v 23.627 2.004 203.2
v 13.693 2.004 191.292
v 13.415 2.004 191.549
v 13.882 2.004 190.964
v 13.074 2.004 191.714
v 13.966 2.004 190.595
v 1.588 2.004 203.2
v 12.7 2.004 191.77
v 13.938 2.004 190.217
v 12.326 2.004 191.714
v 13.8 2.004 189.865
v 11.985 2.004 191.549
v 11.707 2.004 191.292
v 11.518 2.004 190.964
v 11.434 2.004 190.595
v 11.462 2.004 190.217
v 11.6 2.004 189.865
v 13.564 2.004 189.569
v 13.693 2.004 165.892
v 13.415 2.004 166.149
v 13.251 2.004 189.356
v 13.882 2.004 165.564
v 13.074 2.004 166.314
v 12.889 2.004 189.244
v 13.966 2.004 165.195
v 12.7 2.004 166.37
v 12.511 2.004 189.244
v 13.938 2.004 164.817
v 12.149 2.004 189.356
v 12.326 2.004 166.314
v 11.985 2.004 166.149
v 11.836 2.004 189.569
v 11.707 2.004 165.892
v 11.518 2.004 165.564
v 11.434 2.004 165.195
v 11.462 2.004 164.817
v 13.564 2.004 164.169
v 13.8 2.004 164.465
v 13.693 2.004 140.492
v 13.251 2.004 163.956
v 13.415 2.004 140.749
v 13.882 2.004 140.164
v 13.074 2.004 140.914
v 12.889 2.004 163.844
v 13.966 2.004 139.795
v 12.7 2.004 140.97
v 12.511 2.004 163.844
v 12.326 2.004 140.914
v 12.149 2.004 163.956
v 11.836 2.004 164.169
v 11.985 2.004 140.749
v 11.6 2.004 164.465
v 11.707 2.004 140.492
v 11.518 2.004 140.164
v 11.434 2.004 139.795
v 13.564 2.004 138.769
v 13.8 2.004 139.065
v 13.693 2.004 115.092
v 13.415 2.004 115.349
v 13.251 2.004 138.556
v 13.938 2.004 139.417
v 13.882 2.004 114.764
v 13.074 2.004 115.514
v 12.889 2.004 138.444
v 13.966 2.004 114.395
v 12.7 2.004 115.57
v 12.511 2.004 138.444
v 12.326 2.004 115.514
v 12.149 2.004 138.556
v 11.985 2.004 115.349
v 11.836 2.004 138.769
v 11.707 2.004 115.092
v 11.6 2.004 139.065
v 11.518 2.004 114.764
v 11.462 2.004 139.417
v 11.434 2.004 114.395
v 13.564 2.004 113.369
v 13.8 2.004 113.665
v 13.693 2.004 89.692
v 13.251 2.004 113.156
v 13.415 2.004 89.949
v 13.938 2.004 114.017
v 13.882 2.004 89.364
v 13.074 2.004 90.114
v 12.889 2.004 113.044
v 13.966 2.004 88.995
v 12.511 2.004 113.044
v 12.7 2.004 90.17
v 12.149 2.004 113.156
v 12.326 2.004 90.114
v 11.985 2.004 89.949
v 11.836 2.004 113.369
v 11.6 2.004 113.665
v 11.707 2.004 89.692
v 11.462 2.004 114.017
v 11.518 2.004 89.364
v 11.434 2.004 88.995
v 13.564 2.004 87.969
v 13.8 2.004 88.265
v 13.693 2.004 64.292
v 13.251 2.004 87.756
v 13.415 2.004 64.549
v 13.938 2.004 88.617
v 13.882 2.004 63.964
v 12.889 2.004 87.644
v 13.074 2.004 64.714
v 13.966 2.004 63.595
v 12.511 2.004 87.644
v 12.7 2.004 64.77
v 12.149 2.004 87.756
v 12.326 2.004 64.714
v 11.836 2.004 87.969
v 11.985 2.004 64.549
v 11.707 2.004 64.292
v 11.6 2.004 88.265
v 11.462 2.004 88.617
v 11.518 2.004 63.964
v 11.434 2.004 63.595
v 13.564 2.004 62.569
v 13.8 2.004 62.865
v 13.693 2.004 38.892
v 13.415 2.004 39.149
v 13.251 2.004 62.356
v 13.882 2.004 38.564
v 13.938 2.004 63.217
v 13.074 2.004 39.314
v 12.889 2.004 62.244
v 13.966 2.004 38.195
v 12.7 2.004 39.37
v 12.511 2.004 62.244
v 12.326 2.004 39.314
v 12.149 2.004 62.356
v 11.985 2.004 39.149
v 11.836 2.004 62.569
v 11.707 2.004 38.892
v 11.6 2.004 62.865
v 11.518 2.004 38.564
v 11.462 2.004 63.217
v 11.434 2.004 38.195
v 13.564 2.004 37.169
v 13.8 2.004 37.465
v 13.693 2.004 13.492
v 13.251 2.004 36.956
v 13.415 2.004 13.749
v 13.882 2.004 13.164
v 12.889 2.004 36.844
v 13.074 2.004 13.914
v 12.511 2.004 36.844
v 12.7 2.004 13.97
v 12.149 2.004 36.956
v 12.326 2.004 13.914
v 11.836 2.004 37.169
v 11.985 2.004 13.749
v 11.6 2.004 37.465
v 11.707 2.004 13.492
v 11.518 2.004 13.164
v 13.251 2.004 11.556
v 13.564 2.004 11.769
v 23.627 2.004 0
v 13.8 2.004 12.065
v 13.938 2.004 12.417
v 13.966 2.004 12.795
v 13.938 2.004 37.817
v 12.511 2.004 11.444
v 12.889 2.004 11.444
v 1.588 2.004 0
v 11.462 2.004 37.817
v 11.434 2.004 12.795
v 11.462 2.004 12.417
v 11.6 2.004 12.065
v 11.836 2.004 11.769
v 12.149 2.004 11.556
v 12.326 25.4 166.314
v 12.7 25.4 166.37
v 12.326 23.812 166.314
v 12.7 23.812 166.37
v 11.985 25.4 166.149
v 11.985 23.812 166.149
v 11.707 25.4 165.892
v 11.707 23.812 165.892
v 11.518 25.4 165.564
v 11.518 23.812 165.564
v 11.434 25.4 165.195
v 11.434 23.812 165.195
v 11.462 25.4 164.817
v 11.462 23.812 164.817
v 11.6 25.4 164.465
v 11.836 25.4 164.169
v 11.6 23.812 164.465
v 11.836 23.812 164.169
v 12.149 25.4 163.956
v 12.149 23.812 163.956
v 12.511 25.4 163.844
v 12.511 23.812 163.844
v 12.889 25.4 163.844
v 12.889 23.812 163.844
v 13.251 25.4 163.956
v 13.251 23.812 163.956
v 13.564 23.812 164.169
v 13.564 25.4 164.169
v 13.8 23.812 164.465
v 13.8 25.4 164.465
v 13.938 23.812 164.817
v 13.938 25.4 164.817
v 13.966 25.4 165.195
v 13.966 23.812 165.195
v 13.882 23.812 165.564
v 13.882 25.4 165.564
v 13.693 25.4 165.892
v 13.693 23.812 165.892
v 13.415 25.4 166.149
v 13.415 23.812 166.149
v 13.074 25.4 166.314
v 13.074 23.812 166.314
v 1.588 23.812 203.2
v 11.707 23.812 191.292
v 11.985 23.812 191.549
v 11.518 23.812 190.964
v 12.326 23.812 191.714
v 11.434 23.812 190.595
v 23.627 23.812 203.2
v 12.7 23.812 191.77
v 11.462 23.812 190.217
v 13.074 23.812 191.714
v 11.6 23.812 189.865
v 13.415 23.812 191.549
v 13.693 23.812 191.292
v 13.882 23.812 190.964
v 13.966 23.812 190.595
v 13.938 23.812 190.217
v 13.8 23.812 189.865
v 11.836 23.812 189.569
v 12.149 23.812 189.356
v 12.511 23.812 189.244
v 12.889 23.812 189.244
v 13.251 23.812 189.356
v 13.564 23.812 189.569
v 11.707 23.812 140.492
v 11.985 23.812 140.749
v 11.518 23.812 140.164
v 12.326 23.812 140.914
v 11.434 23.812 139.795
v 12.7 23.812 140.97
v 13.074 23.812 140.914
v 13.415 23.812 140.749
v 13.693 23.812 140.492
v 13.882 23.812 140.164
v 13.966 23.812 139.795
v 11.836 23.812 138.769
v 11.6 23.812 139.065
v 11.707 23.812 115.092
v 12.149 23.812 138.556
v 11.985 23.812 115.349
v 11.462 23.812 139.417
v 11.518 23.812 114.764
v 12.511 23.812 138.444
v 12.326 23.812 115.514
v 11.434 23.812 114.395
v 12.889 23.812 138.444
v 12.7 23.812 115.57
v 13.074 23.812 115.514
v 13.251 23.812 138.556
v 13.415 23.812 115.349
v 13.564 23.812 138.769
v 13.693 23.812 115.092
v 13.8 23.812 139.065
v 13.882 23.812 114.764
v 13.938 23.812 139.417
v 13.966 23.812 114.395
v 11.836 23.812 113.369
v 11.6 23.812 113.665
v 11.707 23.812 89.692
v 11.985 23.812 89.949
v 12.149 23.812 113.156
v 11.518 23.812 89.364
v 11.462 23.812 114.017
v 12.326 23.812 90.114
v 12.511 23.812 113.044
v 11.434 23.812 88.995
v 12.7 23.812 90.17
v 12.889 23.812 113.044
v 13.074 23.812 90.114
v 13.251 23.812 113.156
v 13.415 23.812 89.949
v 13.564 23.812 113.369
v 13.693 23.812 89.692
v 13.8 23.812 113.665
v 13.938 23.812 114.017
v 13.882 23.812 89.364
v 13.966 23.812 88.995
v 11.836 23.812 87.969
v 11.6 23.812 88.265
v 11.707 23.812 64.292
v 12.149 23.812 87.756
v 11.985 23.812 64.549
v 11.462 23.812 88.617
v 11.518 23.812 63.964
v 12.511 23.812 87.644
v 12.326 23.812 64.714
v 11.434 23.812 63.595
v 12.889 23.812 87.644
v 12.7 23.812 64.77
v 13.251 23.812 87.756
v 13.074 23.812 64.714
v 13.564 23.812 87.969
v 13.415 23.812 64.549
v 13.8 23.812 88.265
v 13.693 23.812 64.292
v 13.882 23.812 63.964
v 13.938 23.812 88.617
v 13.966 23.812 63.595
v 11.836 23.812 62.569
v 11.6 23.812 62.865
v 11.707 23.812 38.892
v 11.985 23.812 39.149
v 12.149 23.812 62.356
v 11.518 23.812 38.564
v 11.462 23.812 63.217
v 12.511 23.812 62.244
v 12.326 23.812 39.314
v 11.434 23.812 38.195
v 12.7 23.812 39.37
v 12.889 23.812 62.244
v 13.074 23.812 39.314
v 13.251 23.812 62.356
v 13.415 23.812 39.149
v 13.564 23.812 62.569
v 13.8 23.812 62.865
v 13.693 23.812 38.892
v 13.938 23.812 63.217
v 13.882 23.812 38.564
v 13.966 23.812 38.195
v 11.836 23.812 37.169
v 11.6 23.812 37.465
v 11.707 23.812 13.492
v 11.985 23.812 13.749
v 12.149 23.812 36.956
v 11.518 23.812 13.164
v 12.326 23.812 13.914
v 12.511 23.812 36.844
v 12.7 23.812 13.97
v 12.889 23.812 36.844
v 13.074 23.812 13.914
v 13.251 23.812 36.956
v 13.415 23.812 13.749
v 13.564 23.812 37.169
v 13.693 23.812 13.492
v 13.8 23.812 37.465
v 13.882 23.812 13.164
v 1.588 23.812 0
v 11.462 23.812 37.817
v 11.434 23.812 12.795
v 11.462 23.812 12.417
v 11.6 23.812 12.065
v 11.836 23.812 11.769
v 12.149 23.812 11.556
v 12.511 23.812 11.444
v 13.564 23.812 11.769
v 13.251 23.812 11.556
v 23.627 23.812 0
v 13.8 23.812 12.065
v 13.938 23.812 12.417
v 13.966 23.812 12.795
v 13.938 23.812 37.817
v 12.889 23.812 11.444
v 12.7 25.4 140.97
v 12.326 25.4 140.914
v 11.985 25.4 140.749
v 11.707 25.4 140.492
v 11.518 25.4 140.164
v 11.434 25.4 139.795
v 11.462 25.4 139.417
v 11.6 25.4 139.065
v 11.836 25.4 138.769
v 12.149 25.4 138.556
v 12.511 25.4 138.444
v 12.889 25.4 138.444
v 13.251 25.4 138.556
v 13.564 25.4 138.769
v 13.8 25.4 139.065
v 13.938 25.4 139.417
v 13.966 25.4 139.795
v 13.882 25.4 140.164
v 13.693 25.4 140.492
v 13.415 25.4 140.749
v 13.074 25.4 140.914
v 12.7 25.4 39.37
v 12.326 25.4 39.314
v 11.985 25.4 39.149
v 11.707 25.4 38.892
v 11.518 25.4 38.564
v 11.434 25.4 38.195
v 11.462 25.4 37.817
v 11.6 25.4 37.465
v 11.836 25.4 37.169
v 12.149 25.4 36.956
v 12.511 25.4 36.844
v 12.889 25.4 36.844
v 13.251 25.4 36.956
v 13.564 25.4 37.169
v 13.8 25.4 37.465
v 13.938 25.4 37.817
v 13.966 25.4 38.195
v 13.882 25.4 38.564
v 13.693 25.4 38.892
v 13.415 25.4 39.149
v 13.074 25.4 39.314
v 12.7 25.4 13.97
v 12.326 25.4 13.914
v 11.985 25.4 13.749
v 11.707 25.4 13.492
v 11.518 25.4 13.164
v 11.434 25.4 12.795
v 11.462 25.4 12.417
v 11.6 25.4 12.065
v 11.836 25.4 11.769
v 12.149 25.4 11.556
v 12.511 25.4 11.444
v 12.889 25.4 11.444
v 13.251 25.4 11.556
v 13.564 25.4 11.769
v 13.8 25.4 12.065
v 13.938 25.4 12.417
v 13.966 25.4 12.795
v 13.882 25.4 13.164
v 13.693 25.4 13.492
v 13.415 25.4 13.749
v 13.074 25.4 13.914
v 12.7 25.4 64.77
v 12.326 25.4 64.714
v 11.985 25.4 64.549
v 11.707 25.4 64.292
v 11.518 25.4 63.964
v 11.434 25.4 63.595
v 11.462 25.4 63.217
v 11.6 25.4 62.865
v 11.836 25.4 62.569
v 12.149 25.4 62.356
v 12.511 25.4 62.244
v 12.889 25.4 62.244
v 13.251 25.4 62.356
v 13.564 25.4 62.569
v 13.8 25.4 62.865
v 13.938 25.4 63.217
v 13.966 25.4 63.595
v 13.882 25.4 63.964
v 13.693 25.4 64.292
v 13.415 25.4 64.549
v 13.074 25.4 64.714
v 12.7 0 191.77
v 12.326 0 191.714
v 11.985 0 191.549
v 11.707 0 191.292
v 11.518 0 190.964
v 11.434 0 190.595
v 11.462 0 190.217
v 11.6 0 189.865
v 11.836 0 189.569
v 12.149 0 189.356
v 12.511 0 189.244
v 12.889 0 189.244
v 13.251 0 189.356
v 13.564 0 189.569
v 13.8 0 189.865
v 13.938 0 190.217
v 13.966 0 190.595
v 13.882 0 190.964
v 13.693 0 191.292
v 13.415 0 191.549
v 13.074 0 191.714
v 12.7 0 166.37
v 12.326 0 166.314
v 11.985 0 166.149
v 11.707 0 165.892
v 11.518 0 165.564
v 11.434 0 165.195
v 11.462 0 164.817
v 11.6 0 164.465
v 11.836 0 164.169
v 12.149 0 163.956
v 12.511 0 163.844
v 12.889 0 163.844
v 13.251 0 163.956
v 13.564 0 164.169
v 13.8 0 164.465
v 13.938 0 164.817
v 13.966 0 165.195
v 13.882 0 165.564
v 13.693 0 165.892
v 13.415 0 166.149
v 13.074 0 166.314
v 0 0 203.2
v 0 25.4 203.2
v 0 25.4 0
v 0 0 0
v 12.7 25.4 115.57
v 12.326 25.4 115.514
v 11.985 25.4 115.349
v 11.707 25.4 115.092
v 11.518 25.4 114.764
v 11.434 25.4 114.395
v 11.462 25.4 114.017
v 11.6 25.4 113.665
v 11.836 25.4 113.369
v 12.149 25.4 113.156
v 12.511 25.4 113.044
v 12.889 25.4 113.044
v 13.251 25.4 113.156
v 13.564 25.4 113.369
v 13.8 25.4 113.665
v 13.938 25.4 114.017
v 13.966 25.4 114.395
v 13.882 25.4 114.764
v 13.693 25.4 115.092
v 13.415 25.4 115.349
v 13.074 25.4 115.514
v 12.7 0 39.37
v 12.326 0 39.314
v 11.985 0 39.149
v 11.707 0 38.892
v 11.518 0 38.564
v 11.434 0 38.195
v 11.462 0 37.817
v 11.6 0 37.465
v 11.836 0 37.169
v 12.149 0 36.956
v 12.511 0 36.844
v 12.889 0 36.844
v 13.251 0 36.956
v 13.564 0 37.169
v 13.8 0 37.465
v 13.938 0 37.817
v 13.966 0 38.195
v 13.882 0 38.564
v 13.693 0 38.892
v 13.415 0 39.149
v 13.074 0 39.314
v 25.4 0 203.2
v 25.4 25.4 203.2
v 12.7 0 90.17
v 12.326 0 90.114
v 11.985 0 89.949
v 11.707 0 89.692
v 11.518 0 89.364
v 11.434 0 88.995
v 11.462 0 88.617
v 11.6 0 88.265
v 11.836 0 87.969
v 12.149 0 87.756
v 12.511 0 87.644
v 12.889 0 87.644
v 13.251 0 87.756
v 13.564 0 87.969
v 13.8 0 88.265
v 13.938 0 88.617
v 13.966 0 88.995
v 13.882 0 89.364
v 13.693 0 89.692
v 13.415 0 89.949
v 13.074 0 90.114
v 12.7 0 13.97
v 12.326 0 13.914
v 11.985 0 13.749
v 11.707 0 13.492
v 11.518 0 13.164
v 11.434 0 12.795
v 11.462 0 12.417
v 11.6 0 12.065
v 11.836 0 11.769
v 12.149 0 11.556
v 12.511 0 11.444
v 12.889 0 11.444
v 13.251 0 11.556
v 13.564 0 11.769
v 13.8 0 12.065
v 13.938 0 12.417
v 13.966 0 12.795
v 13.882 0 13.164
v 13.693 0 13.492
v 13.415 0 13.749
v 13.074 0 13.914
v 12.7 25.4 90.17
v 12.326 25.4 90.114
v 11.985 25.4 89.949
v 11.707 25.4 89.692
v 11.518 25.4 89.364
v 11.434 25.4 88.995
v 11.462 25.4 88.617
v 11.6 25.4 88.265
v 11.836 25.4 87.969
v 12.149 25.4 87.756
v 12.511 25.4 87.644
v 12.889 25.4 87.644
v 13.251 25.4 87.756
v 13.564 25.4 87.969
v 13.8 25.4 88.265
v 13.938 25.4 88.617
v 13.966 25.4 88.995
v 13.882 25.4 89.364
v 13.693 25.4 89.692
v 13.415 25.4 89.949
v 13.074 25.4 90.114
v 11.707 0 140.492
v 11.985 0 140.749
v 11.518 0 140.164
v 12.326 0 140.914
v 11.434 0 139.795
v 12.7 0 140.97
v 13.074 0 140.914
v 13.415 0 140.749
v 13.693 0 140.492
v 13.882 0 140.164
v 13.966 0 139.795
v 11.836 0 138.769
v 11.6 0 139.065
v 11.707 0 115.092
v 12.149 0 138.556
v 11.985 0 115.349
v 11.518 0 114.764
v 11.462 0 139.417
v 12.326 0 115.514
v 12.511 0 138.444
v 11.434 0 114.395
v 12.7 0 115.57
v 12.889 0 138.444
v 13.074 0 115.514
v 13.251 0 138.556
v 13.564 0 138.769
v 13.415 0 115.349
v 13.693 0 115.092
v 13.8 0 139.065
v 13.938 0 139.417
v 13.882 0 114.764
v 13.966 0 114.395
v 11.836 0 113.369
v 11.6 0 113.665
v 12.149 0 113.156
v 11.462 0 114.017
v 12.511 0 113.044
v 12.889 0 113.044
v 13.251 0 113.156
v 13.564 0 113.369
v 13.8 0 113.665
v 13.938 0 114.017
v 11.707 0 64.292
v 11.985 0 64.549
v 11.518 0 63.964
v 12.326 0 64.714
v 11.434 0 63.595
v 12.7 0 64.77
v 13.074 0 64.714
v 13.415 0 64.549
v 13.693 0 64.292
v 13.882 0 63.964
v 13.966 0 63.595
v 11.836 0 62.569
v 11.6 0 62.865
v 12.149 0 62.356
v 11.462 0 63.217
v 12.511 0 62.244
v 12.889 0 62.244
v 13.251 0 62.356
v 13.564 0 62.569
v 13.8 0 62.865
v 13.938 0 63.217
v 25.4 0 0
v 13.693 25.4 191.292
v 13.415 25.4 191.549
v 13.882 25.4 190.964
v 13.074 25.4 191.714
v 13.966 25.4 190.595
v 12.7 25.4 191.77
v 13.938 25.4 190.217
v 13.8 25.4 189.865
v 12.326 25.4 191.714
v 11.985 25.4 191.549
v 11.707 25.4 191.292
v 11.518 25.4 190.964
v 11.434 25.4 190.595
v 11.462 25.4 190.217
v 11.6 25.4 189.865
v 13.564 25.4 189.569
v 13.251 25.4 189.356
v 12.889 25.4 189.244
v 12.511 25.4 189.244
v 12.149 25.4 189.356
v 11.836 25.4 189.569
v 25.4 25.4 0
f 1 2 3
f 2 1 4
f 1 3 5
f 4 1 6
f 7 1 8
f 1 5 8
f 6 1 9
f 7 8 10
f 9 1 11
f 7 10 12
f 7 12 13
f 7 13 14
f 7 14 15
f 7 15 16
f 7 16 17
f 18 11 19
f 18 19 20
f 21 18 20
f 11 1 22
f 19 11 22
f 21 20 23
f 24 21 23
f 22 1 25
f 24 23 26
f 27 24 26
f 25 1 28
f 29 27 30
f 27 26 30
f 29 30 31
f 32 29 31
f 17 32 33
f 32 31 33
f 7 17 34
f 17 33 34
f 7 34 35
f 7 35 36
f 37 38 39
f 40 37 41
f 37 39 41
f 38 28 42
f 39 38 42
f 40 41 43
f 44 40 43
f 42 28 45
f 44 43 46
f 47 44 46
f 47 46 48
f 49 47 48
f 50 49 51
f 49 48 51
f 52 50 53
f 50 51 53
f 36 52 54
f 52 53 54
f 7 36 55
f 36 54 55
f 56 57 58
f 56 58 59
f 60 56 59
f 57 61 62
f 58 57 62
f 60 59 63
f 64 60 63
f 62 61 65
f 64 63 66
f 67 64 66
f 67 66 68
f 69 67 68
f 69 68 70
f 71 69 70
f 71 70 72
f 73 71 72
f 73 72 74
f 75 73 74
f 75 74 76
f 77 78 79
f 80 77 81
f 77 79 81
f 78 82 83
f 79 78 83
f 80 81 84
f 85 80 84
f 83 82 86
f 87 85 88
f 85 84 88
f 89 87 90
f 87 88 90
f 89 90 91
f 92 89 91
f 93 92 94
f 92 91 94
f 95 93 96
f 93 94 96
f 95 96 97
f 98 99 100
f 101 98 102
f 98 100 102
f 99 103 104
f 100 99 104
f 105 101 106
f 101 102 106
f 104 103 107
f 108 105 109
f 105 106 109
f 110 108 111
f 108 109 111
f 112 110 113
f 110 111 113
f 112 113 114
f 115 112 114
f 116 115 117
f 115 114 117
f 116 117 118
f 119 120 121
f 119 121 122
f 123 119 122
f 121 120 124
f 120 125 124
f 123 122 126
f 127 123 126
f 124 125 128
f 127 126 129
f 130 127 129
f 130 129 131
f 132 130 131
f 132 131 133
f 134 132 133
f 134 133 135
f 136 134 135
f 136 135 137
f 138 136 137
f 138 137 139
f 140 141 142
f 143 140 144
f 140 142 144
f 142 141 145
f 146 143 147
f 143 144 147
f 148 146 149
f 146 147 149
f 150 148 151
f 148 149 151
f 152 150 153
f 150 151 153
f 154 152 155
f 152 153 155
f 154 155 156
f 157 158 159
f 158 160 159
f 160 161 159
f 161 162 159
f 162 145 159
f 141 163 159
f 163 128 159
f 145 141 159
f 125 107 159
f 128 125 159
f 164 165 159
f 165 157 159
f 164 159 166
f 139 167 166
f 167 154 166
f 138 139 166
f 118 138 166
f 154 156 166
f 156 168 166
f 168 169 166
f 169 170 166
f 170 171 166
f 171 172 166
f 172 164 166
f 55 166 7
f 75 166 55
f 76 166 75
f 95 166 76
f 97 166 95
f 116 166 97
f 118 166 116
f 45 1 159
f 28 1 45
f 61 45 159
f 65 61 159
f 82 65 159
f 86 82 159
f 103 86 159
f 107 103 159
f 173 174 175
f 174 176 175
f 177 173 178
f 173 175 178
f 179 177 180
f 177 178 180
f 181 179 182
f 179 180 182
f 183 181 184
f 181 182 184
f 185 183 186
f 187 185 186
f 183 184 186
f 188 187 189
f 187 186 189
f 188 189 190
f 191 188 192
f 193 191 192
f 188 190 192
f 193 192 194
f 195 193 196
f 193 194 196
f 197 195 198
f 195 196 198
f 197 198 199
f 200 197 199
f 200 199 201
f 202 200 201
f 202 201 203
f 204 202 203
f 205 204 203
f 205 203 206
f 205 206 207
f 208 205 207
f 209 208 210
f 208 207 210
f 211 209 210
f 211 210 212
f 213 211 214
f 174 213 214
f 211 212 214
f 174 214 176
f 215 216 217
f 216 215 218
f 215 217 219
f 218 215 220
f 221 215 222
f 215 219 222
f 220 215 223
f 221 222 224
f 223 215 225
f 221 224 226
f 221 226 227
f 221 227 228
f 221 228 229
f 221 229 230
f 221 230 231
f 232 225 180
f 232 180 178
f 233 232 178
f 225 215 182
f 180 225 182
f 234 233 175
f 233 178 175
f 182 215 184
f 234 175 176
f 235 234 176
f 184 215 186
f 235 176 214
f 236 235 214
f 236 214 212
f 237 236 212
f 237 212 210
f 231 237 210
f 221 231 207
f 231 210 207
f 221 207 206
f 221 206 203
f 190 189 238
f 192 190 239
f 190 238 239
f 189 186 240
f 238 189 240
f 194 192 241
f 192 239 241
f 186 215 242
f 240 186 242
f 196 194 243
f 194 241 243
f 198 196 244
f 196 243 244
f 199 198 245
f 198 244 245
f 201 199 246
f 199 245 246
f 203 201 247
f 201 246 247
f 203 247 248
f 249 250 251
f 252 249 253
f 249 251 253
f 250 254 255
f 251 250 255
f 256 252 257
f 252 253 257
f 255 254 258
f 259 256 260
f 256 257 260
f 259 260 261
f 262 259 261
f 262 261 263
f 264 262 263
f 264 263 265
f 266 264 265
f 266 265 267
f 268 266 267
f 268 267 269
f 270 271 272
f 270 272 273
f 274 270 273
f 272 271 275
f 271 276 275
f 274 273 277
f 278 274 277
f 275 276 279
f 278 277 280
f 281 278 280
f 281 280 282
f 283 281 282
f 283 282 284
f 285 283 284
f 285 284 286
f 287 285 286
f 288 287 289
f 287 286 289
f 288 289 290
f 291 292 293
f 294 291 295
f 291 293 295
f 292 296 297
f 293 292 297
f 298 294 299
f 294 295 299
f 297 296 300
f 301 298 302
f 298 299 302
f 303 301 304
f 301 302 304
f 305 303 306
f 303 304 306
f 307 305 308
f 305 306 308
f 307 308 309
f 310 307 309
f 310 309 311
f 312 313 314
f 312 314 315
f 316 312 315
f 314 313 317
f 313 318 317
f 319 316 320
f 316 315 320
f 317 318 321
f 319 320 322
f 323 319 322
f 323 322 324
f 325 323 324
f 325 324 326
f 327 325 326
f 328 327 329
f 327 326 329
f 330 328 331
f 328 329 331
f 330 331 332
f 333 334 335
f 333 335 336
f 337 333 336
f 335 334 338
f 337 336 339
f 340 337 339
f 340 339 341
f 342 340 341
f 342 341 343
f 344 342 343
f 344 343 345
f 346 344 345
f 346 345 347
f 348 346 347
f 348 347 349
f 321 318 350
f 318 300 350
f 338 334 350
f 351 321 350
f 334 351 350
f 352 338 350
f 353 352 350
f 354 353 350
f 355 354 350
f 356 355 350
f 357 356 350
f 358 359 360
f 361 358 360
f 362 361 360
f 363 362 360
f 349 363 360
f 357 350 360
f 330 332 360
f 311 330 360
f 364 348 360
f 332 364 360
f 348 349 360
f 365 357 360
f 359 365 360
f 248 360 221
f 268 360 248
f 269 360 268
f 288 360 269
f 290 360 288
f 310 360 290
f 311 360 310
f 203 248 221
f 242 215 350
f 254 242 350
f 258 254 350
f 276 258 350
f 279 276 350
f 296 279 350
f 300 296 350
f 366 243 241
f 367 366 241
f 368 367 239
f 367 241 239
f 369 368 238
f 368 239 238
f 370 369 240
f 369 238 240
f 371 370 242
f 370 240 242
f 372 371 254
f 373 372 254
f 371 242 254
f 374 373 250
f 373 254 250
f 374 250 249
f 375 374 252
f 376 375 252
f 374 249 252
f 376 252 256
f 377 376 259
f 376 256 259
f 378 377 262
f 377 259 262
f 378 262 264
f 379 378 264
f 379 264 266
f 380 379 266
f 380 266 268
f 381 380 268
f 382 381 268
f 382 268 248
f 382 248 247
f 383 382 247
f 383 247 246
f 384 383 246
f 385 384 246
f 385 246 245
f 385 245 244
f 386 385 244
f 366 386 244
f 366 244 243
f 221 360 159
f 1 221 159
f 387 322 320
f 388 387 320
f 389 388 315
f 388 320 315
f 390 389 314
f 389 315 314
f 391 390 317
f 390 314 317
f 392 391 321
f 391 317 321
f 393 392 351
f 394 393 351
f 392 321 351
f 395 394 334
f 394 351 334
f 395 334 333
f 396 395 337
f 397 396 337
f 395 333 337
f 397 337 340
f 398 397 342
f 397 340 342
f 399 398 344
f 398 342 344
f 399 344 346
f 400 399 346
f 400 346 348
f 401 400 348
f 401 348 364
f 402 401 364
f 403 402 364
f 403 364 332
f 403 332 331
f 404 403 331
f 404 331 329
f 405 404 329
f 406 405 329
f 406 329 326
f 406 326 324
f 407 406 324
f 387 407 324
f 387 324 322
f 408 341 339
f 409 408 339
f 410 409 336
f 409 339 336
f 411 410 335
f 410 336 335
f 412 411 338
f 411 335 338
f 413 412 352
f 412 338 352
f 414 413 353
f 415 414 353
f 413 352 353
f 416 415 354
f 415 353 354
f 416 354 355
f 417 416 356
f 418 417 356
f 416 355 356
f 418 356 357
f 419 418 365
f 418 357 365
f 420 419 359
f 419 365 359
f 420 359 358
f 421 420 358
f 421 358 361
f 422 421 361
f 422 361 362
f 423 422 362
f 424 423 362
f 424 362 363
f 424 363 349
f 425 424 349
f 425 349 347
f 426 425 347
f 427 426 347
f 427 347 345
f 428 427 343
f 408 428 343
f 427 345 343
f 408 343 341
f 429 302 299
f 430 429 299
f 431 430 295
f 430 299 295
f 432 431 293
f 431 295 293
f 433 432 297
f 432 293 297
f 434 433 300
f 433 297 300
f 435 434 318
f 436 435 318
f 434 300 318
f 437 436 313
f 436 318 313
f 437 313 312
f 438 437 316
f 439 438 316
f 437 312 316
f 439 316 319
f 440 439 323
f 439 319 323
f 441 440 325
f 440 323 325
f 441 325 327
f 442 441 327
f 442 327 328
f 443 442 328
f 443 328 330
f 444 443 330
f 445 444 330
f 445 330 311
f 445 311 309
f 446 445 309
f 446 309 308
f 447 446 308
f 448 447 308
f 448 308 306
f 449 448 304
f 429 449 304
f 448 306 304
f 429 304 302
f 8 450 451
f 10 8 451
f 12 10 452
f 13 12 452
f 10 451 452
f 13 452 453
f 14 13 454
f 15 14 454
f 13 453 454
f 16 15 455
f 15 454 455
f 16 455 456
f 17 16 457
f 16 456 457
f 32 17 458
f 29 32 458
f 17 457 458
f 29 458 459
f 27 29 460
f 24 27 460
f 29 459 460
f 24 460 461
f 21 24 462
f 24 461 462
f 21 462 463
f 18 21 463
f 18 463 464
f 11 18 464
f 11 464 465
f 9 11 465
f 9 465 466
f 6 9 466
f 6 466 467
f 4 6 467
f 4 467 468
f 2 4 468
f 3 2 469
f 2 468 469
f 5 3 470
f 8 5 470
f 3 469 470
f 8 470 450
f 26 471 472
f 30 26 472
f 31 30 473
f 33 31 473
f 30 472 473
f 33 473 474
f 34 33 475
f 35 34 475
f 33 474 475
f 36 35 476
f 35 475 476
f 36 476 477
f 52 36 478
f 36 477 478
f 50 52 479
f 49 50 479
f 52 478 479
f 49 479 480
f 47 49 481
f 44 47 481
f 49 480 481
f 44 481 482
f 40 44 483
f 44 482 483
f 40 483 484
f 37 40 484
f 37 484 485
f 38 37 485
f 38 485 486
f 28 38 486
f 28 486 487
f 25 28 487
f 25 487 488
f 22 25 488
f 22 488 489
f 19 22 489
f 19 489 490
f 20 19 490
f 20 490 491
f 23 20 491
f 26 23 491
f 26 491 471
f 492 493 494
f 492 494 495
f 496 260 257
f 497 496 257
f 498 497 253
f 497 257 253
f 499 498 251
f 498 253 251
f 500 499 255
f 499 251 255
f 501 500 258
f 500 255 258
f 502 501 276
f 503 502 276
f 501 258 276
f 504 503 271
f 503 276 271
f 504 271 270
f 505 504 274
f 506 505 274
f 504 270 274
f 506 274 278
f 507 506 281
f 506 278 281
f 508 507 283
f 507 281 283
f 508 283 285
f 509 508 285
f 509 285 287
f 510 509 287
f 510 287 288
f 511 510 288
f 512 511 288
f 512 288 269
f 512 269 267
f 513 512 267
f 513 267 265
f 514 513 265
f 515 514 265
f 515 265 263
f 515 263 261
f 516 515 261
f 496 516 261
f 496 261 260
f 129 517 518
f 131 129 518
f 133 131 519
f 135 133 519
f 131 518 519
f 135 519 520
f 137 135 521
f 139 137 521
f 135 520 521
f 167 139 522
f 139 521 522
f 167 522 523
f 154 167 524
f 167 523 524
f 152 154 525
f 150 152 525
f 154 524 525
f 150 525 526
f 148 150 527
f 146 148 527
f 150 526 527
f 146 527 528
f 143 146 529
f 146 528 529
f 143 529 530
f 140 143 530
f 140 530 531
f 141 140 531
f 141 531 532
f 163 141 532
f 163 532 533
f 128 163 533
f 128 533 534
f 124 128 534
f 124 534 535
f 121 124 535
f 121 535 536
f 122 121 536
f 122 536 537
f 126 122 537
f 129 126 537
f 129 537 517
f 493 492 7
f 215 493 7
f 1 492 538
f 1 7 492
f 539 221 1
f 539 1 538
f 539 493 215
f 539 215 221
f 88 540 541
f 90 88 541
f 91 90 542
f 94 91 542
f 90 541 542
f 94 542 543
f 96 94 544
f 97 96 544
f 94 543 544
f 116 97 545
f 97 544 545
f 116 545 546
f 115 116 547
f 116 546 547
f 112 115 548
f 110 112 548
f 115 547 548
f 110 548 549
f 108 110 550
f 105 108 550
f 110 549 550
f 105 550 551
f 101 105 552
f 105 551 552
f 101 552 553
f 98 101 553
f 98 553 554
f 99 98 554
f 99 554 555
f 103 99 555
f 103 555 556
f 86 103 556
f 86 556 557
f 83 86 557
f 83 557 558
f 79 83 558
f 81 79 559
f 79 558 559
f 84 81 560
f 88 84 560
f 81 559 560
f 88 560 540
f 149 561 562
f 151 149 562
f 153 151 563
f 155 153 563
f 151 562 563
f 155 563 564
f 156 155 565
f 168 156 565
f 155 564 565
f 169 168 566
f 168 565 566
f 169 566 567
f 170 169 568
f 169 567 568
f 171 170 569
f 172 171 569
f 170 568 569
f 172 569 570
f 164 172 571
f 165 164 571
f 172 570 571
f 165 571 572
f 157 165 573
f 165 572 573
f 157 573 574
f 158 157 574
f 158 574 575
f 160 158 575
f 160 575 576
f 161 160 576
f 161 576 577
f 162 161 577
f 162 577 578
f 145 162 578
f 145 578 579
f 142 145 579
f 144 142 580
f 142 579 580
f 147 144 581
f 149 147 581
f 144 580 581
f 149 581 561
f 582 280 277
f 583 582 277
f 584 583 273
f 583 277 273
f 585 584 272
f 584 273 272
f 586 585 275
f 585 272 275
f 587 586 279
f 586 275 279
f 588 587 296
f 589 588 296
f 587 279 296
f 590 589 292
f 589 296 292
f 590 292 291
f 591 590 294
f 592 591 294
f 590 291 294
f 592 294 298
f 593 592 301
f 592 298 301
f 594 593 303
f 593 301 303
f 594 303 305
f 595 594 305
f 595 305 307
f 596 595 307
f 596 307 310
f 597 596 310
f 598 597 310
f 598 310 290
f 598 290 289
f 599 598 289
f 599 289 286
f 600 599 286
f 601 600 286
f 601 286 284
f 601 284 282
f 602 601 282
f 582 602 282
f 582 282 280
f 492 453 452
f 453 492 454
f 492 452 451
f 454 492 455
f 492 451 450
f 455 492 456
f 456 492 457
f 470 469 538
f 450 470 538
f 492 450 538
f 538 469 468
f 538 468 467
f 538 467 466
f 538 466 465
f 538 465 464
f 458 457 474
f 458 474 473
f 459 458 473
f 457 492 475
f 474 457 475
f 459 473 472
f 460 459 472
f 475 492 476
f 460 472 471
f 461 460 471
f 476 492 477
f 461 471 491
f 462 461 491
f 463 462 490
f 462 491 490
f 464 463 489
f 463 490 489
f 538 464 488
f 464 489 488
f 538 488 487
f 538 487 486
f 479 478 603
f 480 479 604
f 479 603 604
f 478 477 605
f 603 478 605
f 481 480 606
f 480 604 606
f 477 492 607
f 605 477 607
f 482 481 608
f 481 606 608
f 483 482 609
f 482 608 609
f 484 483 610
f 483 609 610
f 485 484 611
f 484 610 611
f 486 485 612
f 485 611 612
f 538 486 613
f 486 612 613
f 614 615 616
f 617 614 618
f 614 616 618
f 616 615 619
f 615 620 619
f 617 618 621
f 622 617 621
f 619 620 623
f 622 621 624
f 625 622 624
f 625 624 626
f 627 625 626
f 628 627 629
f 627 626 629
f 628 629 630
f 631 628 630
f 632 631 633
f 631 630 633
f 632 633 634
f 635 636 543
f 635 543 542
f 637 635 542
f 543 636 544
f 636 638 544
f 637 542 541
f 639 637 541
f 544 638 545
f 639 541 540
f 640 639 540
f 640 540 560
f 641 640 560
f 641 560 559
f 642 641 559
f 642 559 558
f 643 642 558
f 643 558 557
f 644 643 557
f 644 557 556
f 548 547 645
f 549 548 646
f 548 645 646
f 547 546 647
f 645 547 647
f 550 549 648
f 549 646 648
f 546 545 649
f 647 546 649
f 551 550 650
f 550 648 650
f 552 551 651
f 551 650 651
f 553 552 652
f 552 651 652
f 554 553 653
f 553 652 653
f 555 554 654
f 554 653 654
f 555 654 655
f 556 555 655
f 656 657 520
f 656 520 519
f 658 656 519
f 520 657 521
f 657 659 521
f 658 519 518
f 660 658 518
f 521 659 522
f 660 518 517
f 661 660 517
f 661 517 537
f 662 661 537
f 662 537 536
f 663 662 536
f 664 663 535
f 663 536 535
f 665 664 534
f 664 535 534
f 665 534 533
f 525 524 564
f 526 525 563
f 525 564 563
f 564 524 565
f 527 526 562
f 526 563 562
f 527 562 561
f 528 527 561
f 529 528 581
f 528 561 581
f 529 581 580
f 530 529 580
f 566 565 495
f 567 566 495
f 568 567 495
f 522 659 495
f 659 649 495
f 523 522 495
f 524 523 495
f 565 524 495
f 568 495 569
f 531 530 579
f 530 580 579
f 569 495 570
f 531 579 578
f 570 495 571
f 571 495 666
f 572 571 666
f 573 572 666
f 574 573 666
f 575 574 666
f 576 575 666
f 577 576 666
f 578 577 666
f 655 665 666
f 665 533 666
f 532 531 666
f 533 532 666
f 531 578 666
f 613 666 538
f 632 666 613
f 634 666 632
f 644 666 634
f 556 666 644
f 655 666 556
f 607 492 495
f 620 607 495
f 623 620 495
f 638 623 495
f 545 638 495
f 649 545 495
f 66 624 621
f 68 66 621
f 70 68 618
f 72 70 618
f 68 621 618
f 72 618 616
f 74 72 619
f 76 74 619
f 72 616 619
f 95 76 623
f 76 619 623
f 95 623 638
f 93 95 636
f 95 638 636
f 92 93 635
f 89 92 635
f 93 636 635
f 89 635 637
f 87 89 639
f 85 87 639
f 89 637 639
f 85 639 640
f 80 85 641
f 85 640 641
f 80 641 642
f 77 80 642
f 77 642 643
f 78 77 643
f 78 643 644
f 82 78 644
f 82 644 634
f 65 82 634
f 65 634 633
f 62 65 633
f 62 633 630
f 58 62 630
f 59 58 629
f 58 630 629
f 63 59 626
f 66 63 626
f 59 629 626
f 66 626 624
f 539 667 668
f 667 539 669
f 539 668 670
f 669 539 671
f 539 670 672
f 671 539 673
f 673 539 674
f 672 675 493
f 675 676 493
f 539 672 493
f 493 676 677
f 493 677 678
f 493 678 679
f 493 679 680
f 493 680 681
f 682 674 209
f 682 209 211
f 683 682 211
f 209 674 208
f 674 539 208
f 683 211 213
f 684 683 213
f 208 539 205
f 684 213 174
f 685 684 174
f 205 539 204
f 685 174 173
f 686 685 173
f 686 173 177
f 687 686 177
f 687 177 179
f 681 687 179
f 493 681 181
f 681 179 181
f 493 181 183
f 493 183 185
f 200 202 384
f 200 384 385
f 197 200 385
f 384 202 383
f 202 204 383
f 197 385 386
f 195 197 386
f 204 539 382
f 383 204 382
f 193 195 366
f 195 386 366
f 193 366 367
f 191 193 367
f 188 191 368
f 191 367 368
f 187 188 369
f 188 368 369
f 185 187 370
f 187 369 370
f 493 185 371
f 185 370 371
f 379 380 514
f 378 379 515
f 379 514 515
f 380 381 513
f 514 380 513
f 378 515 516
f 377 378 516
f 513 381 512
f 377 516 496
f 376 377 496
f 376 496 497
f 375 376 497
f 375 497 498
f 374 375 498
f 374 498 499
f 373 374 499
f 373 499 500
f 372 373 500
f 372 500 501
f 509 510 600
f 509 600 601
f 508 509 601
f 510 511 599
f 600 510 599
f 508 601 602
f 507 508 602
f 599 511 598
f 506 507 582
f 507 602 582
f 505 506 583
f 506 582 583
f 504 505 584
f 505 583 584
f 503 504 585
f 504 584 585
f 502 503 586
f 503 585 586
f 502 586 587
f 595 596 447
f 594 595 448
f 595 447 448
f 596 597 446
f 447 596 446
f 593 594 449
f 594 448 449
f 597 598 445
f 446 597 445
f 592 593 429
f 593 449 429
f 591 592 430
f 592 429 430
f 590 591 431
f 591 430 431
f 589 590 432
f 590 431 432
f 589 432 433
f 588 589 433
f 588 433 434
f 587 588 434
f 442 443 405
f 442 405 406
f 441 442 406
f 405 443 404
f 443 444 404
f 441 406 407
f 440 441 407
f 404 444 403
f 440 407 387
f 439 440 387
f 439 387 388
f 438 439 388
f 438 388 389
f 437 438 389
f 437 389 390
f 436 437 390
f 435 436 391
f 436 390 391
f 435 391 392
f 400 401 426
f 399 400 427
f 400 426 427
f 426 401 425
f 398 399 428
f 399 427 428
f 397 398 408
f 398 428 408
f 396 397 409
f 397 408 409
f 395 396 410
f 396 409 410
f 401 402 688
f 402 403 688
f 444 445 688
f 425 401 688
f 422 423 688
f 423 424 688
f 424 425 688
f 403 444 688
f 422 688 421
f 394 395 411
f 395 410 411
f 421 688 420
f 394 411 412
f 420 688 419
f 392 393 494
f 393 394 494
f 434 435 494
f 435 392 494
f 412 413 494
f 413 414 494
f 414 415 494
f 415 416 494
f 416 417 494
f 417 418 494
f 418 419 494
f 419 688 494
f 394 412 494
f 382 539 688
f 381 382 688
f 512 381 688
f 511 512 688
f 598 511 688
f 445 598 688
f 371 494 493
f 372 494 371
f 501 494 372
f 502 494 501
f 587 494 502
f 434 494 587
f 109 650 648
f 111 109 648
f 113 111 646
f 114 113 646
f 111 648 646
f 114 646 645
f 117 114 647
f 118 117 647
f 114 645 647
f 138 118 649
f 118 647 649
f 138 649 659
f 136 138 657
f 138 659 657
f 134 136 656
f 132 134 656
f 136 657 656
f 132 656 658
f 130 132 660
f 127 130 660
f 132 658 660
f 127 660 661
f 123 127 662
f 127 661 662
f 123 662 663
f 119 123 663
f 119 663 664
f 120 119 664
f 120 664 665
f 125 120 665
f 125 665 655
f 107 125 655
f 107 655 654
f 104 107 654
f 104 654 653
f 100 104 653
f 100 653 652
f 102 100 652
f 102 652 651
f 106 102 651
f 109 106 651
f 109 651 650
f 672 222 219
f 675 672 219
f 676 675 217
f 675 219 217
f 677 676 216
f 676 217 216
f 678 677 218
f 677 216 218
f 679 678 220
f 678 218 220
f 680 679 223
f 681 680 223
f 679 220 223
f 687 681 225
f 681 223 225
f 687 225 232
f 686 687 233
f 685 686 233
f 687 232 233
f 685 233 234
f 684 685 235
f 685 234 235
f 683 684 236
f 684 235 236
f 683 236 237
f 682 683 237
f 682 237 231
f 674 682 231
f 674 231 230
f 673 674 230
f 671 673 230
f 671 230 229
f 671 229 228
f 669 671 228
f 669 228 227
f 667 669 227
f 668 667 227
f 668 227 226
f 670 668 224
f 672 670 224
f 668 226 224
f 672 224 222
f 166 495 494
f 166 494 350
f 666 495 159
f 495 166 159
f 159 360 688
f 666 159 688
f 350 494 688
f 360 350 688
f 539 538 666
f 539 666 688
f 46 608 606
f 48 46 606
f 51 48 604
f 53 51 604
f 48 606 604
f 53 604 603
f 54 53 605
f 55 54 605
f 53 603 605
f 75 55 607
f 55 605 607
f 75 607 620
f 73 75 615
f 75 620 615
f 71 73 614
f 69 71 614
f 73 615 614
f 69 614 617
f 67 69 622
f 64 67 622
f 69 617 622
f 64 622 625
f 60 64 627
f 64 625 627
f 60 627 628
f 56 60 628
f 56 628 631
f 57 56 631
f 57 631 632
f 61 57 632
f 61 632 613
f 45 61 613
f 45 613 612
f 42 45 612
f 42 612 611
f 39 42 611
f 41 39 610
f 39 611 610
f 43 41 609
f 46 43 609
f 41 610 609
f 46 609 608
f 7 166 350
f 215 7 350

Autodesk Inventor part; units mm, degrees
ref_plane "YZ Plane" through (0, 0, 0) normal (1, 0, 0) x (0, 1, 0)
ref_plane "XZ Plane" through (0, 0, 0) normal (0, 1, 0) x (-1, 0, 0)
ref_plane "XY Plane" through (0, 0, 0) normal (0, 0, 1) x (1, 0, 0)
sketch "Sketch1" plane through (0, 0, 0) normal (0, 0, 1) x (1, 0, 0)
  line L0 (0, 0) -> (25.4, 0)
  line L1 (25.4, 0) -> (25.4, 25.4)
  line L2 (25.4, 25.4) -> (0, 25.4)
  line L3 (0, 25.4) -> (0, 0)
  line L4 (1.5875, 23.8125) -> (23.6267, 23.8125)
  line L5 (23.6267, 23.8125) -> (23.6267, 2.0041)
  line L6 (23.6267, 2.0041) -> (1.5875, 2.0041)
  line L7 (1.5875, 2.0041) -> (1.5875, 23.8125)
  dimension "d0" = 25.4
  dimension "d1" = 25.4
  dimension "d2" = 1.5875
  dimension "d3" = 1.5875
extrude "Extrusion1" add sketch "Sketch1" along normal blind 203.2
sketch "Sketch2" plane through (0, 25.4, 0) normal (0, 1, 0) x (1, 0, 0)
  line L0 (25.4, 0) -> (0, 0) projected
  line L1 (25.4, 0) -> (25.4, -203.2) projected
  point P0 (12.7, -12.7)
  point P1 (12.7, -38.1)
  point P2 (12.7, -63.5)
  point P3 (12.7, -88.9)
  point P4 (12.7, -114.3)
  point P5 (12.7, -139.7)
  point P6 (12.7, -165.1)
  point P7 (12.7, -190.5)
  point P8 (12.7, -215.9)
  point P9 (12.7, -241.3)
  point P10 (12.7, -266.7)
  point P11 (12.7, -292.1)
  point P12 (12.7, -317.5)
  point P13 (12.7, -342.9)
  point P14 (12.7, -368.3)
  dimension "d6" = 12.7
  dimension "d7" = 12.7
  dimension "d10" = 25.4
hole "Hole1" at (12.7, 25.4, 12.7) at (12.7, 25.4, 38.1) at (12.7, 25.4, 63.5) at (12.7, 25.4, 88.9) at (12.7, 25.4, 114.3) at (12.7, 25.4, 139.7) at (12.7, 25.4, 165.1) at (12.7, 25.4, 190.5) at (12.7, 25.4, 215.9) at (12.7, 25.4, 241.3) at (12.7, 25.4, 266.7) at (12.7, 25.4, 292.1) at (12.7, 25.4, 317.5) at (12.7, 25.4, 342.9) at (12.7, 25.4, 368.3) direction (0, -1, 0) diameter 2.54 depth 25.4 tip angle 118
properties part number "Drive Rail 1 upright 2"
